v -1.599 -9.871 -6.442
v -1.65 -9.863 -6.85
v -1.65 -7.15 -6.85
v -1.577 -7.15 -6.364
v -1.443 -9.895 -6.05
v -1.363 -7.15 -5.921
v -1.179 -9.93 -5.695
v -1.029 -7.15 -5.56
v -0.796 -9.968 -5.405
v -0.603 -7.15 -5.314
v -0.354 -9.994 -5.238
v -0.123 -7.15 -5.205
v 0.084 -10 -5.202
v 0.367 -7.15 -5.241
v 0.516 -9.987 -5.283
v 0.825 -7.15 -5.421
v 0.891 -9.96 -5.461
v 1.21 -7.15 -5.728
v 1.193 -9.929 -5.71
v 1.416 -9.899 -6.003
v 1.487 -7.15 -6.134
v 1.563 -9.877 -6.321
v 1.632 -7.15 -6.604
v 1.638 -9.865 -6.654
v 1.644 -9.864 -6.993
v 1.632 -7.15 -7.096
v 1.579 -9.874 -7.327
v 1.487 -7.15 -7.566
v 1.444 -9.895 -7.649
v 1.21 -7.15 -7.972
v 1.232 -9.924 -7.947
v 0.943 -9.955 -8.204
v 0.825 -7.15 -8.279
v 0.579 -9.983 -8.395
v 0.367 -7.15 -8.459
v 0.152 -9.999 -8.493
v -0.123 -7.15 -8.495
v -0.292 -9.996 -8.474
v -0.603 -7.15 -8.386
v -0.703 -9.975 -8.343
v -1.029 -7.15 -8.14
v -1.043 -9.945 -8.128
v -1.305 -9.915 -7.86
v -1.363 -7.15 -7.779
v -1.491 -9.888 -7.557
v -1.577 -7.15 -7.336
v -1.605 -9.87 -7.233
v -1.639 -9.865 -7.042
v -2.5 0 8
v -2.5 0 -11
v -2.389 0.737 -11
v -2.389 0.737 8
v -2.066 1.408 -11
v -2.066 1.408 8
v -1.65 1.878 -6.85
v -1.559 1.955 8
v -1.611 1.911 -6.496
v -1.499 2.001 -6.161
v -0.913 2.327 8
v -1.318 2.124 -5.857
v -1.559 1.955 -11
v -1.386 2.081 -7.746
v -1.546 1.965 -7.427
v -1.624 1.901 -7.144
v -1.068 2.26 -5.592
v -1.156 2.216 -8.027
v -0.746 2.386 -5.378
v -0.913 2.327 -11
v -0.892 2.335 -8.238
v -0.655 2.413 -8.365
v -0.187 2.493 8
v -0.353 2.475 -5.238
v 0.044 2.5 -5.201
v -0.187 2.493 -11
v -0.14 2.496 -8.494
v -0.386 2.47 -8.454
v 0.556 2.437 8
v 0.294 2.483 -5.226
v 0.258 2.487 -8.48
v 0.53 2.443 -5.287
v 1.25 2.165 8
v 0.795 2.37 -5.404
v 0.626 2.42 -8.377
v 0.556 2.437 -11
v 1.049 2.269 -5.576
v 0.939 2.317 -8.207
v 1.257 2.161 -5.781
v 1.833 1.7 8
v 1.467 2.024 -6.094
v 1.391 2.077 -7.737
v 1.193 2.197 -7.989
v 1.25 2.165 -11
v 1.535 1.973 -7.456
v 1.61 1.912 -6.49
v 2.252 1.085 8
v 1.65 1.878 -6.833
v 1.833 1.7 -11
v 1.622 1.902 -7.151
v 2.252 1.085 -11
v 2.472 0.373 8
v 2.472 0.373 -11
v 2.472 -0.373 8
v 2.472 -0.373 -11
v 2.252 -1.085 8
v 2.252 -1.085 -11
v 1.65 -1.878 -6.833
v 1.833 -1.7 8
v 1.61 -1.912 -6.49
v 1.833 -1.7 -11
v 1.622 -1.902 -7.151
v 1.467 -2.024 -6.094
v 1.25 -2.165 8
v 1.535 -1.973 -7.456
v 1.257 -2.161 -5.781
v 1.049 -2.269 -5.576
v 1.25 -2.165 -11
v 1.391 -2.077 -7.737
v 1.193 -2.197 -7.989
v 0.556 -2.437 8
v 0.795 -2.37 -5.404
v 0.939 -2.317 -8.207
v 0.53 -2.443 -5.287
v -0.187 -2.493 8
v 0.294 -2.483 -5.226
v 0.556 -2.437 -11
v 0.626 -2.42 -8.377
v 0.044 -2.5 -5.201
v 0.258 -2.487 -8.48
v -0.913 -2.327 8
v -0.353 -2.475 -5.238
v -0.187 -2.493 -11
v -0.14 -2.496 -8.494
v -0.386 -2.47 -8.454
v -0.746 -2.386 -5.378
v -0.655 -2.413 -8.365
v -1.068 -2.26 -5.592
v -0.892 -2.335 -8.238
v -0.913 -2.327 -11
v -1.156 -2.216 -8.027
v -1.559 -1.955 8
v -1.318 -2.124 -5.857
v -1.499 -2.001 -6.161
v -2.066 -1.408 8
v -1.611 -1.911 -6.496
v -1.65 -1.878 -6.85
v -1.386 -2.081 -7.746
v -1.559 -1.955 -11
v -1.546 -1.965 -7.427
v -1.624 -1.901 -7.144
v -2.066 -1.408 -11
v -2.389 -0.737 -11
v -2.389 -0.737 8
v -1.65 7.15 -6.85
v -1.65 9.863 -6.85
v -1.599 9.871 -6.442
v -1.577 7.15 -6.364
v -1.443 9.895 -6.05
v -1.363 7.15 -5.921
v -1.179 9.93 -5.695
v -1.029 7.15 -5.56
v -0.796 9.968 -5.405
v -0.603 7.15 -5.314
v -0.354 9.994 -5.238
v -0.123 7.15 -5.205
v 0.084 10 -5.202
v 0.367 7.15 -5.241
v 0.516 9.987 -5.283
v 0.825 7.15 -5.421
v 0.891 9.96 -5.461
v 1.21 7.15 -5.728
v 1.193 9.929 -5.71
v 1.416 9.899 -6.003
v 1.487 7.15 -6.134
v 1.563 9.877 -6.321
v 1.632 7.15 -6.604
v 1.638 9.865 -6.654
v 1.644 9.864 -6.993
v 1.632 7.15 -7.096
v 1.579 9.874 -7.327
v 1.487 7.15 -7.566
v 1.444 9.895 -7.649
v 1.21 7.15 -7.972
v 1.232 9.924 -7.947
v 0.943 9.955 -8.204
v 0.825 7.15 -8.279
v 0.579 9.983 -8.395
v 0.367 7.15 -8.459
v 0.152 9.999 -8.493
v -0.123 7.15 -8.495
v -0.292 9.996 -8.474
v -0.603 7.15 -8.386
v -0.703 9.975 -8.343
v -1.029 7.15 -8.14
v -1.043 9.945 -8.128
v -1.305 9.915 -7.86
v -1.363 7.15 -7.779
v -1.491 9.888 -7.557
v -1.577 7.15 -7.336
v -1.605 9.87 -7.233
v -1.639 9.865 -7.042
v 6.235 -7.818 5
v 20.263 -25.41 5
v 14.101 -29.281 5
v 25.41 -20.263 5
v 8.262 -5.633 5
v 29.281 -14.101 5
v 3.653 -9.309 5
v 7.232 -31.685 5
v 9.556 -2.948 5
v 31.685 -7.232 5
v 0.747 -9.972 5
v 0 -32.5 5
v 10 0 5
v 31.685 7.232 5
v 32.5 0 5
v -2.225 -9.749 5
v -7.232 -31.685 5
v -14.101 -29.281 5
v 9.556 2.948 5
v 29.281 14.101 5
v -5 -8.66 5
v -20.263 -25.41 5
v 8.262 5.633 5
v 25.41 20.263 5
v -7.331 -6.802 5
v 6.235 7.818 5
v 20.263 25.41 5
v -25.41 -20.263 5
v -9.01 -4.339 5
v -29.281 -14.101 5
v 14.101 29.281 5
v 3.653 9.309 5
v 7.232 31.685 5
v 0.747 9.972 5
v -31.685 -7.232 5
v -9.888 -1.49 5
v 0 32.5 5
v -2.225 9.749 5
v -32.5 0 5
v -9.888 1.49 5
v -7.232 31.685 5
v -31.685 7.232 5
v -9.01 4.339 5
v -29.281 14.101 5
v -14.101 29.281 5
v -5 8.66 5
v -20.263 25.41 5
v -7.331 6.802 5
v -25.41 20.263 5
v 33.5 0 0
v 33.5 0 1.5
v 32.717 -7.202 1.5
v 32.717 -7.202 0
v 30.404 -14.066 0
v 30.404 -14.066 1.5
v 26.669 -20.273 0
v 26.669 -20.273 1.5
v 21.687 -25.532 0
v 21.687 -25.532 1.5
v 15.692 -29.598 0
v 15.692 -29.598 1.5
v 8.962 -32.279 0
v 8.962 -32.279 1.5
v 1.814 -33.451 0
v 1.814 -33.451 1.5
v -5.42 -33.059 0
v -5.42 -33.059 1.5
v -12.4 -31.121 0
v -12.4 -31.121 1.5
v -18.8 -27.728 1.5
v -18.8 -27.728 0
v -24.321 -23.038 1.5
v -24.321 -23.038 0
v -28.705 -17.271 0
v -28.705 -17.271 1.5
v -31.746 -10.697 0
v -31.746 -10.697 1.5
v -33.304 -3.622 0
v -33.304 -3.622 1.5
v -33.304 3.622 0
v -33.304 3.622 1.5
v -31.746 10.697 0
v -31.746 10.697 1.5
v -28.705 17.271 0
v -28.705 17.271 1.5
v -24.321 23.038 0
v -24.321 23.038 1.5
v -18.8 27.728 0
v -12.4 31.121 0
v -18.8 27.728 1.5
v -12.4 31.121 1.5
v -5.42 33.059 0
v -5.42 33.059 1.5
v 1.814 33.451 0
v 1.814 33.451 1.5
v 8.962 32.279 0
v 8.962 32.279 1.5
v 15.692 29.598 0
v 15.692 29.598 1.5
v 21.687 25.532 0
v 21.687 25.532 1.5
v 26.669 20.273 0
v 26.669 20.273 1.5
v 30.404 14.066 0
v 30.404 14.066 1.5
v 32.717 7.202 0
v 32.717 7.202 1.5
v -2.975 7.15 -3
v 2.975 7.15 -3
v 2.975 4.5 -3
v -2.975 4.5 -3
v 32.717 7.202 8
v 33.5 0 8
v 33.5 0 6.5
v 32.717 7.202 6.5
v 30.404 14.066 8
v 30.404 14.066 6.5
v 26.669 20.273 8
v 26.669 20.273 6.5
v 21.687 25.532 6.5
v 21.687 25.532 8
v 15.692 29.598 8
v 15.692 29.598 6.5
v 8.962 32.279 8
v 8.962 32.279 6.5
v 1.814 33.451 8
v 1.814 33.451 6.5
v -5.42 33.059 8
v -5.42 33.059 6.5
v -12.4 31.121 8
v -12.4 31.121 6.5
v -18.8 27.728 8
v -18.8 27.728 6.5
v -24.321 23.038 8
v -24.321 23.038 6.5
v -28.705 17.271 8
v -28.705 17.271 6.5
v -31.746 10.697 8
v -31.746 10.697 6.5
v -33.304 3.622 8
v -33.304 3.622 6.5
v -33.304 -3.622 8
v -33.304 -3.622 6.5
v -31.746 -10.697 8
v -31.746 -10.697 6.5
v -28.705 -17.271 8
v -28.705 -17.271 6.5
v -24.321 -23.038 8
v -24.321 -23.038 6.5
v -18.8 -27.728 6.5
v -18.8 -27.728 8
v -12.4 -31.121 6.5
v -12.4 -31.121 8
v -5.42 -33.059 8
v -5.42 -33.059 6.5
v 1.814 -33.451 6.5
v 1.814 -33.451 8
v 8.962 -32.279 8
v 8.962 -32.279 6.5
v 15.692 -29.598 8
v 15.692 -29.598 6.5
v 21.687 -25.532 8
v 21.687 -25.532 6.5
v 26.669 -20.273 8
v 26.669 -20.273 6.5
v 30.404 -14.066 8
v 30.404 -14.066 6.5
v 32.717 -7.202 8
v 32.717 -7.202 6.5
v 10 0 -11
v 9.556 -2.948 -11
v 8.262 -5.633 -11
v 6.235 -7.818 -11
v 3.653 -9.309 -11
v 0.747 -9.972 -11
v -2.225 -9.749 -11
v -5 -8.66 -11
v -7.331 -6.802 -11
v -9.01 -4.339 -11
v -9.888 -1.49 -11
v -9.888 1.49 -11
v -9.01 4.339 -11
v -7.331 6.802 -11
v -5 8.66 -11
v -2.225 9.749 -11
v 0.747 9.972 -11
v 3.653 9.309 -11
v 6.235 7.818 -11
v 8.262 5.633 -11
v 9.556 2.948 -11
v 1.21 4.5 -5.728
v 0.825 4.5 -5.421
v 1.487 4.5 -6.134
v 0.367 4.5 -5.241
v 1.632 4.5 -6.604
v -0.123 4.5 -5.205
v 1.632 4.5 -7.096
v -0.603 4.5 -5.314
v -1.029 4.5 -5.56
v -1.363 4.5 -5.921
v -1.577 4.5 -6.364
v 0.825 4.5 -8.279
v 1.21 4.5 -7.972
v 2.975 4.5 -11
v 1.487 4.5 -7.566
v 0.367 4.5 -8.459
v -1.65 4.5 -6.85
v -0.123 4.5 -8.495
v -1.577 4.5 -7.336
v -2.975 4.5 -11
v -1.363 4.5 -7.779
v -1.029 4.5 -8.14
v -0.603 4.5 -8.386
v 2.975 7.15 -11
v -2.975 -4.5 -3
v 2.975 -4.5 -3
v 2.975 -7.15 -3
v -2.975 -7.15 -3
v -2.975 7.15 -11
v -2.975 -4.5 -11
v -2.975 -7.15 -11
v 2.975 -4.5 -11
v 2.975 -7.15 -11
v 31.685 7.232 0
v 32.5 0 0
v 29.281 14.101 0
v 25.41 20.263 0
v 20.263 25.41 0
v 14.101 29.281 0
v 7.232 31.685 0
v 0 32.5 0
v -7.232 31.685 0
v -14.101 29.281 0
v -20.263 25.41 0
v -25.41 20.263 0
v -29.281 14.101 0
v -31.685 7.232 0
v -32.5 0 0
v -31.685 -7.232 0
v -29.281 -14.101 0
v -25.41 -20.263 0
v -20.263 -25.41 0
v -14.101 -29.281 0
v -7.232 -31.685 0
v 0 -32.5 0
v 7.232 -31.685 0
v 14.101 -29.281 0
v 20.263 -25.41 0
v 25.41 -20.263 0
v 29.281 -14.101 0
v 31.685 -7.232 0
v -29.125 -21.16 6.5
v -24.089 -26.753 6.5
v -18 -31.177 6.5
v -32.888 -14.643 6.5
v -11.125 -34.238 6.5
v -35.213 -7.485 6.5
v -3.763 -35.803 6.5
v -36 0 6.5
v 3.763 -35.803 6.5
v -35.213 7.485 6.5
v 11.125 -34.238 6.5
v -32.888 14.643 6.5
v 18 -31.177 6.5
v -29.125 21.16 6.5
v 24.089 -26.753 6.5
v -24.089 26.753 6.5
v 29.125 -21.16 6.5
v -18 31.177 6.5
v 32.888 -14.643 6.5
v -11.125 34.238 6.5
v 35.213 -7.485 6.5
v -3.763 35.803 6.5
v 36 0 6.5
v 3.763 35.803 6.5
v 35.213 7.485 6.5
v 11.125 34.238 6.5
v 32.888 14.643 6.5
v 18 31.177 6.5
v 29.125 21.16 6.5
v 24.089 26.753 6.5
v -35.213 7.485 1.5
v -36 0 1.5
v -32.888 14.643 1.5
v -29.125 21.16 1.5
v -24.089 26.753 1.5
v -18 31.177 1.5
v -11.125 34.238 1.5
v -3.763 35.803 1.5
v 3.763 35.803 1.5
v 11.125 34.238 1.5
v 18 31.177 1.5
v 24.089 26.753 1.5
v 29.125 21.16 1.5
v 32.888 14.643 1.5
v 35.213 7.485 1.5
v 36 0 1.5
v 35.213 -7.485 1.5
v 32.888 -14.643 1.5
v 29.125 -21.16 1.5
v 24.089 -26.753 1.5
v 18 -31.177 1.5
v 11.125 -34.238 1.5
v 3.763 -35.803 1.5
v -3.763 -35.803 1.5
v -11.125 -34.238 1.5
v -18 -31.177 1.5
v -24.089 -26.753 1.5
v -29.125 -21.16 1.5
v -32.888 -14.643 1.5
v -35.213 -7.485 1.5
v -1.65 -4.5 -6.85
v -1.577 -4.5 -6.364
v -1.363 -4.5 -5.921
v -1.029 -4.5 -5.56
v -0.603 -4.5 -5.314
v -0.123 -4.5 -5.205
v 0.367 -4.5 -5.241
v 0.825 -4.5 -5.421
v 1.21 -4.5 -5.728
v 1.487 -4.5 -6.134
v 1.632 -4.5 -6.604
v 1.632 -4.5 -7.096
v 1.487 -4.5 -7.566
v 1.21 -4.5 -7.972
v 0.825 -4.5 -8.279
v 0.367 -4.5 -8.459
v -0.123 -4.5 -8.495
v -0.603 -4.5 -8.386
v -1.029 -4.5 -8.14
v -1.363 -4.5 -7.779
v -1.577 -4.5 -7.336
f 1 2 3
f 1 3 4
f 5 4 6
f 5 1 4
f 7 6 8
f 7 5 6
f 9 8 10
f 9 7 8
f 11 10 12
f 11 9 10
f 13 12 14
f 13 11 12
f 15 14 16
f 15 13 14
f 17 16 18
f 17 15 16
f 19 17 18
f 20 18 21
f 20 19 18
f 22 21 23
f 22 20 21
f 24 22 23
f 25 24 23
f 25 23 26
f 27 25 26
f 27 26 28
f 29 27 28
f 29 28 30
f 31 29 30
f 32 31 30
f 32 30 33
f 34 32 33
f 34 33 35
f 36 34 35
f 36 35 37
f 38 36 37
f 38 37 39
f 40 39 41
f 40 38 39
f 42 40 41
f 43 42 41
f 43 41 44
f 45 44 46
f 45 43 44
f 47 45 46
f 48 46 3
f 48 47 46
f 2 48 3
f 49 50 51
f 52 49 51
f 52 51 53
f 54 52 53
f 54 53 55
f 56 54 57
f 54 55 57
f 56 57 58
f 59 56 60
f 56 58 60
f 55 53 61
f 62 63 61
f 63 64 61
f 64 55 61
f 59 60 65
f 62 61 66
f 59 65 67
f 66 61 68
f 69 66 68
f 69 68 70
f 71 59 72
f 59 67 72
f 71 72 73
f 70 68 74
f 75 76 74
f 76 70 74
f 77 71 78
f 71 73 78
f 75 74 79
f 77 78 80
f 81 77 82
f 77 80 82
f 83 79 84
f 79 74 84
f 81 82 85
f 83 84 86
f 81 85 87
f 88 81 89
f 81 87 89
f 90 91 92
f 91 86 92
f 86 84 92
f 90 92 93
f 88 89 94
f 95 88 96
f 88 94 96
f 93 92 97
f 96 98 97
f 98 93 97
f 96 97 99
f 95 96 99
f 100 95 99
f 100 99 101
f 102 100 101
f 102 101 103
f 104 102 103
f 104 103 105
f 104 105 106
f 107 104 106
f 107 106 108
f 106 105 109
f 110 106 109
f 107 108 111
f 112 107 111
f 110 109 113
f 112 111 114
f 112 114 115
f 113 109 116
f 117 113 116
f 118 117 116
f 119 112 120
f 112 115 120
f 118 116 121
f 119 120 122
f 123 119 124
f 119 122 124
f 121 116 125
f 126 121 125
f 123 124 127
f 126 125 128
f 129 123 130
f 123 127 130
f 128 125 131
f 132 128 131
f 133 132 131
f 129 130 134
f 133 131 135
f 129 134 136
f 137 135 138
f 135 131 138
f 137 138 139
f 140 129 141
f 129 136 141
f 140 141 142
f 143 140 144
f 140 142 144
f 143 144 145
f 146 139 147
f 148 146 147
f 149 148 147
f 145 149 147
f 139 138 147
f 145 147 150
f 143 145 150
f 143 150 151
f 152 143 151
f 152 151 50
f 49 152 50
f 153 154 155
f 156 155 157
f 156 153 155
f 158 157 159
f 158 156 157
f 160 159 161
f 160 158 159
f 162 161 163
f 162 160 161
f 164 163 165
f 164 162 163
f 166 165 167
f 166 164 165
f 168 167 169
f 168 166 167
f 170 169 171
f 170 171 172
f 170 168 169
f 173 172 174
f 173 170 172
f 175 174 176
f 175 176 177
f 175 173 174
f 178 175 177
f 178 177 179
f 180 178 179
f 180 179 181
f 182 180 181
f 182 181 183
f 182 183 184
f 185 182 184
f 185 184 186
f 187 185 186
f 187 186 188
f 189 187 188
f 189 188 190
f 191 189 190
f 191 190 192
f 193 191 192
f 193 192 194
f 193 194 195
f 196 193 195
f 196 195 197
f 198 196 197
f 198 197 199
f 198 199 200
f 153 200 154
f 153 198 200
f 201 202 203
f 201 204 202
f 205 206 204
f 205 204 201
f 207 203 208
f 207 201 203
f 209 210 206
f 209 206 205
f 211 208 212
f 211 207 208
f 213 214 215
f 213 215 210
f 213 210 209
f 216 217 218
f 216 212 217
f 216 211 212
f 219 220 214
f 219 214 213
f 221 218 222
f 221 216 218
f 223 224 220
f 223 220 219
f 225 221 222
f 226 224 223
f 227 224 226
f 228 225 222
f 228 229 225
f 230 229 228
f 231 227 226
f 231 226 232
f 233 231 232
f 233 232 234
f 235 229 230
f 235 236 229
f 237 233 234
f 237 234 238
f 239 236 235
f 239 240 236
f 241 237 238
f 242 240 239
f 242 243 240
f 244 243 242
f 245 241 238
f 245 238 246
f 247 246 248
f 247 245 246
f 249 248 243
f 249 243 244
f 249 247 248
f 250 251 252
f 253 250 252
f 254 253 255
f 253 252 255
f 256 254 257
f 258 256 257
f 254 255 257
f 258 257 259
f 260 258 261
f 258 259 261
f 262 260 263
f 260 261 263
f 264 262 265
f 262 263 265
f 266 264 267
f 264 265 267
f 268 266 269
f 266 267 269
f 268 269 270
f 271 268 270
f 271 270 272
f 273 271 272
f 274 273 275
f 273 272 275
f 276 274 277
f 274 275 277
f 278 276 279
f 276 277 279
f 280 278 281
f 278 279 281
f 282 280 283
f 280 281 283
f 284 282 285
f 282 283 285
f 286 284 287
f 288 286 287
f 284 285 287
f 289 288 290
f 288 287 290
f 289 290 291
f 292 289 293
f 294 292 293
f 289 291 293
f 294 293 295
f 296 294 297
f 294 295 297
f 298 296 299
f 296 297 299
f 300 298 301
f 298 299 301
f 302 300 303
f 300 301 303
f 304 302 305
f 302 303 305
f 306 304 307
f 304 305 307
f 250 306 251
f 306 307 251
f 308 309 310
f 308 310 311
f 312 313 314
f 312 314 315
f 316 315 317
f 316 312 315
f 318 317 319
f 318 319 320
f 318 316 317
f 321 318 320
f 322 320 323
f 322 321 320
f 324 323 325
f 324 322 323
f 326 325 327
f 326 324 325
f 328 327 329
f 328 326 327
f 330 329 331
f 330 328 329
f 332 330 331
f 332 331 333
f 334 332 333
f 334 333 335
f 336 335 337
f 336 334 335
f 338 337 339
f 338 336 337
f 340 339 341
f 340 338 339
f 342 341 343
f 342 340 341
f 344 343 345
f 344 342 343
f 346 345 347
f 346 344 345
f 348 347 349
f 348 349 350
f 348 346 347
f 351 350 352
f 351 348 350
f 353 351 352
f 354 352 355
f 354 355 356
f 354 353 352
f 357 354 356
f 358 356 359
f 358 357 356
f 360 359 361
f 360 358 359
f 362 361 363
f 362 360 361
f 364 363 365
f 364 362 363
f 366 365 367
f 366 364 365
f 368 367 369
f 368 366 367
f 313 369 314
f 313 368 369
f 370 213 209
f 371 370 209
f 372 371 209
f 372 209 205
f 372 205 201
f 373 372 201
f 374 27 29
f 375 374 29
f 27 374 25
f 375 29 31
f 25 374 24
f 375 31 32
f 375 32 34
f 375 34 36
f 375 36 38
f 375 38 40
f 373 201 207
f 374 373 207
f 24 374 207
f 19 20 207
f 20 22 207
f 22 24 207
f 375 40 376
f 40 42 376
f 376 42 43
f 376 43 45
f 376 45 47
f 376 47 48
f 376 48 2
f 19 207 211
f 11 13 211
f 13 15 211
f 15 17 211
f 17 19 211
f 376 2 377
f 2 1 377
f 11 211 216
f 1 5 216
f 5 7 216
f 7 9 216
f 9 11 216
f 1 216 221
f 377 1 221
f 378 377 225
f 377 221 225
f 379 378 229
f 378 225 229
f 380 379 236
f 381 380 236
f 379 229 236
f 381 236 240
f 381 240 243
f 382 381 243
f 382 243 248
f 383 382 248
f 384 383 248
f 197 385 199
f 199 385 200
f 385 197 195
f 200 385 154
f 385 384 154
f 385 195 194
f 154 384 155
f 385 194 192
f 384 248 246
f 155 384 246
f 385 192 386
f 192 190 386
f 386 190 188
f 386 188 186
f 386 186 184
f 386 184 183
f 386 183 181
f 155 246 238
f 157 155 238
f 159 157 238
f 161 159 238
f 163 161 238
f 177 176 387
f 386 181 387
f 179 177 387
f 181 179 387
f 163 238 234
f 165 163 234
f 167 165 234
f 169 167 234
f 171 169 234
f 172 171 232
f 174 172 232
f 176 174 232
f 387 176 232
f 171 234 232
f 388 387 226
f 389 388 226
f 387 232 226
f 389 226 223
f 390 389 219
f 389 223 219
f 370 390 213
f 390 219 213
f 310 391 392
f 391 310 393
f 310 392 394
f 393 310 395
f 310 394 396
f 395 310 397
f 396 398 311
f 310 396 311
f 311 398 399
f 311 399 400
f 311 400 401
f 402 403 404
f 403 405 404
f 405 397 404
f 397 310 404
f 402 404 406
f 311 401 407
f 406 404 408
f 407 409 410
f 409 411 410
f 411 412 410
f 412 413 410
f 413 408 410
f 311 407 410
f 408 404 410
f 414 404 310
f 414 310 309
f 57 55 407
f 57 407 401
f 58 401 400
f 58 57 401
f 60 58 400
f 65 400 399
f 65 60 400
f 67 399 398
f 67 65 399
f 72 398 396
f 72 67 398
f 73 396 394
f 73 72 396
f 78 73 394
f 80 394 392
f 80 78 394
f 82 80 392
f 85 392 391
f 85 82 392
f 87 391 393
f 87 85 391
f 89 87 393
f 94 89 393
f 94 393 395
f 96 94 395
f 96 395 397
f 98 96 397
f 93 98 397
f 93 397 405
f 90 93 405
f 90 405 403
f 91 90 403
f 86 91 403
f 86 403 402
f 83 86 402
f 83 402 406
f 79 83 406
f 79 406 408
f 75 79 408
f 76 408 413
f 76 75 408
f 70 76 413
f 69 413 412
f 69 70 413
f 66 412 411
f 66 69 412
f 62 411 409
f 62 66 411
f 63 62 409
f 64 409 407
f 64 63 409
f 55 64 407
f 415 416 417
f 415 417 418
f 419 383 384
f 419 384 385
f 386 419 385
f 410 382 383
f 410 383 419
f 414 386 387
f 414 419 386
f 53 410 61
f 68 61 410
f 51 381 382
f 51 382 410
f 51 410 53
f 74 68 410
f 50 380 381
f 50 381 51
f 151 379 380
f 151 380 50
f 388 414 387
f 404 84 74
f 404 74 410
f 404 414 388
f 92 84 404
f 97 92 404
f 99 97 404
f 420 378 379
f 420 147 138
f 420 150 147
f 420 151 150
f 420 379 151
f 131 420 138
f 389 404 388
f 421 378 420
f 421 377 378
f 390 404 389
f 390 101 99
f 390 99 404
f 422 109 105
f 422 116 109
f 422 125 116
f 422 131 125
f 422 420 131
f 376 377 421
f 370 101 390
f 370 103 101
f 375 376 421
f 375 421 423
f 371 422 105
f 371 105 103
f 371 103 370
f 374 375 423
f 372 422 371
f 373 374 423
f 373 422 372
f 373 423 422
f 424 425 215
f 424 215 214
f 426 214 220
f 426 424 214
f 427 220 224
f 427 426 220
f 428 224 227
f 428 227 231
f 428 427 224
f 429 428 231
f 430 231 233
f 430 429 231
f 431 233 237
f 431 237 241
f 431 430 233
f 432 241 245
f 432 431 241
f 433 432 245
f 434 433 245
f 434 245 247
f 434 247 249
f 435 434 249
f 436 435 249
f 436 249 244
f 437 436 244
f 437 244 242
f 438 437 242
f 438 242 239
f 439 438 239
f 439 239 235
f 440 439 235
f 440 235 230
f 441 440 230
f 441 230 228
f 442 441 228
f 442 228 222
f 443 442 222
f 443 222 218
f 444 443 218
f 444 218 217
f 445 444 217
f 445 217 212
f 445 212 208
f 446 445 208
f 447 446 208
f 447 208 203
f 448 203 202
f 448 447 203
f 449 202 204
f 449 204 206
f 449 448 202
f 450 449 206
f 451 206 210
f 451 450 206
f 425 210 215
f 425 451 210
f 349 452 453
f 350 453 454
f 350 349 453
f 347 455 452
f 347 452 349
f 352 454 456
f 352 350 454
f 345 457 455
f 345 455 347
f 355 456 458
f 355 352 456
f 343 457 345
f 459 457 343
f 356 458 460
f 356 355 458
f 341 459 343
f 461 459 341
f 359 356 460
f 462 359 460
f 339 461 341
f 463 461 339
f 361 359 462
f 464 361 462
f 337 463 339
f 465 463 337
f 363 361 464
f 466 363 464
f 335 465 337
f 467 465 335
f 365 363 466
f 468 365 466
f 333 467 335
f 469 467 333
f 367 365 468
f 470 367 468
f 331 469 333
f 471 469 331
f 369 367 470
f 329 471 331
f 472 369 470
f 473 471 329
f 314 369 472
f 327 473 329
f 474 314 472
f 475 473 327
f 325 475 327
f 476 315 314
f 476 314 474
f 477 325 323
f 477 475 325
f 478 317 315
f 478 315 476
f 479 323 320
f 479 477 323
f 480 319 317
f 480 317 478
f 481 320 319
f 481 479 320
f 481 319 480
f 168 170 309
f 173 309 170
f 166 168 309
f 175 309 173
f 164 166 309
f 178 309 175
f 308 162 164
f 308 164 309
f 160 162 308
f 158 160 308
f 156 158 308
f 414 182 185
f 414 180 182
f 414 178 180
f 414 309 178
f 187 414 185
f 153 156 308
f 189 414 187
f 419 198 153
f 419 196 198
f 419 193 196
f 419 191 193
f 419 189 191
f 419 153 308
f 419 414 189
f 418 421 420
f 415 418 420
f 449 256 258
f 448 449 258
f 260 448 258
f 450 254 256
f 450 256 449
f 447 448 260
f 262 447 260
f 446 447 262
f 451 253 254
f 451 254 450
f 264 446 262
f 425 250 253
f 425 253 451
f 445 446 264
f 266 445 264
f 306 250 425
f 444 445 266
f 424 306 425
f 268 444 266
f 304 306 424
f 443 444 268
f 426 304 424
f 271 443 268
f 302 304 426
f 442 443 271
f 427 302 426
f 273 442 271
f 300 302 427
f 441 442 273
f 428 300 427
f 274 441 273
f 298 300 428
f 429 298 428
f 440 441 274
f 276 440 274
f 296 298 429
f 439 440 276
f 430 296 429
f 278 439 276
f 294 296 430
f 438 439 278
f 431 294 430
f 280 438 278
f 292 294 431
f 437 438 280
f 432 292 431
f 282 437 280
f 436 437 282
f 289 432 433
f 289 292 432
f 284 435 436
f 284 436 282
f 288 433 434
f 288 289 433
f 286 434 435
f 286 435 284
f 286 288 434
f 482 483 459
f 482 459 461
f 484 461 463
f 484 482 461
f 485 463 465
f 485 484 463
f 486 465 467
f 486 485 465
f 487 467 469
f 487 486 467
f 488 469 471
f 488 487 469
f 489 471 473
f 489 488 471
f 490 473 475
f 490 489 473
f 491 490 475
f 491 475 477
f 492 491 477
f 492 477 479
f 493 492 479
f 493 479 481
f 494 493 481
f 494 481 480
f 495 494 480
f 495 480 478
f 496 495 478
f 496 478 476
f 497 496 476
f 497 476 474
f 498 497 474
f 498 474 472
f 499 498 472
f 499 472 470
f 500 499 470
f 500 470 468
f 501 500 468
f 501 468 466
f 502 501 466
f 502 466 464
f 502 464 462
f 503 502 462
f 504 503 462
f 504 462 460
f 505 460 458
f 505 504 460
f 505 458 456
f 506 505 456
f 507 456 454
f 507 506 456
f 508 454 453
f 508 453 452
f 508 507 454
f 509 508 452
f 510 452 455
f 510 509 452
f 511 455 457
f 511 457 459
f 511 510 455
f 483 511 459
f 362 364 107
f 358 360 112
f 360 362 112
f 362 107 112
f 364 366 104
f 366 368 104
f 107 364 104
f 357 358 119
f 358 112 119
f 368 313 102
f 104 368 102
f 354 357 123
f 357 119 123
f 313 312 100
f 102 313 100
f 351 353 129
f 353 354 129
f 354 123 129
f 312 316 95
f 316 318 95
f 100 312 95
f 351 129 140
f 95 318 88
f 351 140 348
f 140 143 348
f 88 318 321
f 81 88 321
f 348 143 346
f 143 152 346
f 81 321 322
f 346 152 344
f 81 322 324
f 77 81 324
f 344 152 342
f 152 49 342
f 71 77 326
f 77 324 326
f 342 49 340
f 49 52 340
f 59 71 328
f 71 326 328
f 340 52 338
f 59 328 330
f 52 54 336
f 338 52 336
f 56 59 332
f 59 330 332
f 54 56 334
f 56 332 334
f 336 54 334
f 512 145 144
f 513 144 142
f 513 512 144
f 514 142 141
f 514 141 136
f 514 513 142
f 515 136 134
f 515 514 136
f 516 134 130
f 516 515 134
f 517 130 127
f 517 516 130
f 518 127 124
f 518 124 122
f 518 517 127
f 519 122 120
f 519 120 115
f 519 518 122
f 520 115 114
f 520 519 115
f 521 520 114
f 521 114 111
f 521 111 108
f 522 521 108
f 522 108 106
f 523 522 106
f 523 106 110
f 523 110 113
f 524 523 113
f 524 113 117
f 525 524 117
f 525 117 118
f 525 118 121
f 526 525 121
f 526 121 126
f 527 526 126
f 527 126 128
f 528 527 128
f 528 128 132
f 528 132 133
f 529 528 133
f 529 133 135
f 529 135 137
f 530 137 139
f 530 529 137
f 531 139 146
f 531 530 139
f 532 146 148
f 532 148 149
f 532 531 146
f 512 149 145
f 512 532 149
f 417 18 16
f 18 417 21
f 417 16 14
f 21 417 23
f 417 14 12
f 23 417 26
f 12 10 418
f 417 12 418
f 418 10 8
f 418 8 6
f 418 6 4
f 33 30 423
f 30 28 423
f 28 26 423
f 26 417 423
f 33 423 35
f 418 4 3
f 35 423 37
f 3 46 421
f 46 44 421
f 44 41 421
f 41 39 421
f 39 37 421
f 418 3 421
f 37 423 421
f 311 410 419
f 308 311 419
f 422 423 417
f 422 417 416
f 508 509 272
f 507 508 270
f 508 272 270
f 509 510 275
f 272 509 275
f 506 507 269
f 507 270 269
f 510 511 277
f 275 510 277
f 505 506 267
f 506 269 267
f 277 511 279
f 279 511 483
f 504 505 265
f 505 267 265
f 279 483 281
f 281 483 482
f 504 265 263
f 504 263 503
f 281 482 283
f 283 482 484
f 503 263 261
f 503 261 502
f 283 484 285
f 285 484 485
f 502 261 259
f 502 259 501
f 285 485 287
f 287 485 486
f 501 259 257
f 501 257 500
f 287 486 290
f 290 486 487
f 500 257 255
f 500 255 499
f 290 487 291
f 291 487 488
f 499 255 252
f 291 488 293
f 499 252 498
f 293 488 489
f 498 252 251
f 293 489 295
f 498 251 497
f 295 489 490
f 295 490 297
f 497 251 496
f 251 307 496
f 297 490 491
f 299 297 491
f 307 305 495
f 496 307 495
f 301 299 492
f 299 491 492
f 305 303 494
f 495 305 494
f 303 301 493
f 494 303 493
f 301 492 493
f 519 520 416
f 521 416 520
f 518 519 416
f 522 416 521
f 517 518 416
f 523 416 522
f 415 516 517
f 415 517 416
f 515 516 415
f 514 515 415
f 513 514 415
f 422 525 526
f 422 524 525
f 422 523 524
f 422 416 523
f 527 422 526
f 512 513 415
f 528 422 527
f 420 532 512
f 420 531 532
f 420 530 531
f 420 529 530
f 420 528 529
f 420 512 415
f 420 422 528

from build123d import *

# Parameters (mm, degrees)
ESBO_O1_R                     = 35
ESBO_O1_R_2                   = 32.5
RESSALTO_EXTRUS_O1_DEPTH      = 8
RESSALTO_EXTRUS_O2_START      = -3
ESBO_O2_R                     = 32.5
RESSALTO_EXTRUS_O2_DEPTH      = 3
ESBO_O3_R                     = 2.5
CORTE_EXTRUS_O1_DEPTH         = 3
RESSALTO_EXTRUS_O3_DEPTH      = 5
RESSALTO_EXTRUS_O3_DEPTH_BACK = 3
ESBO_O4_R                     = 37
ESBO_O4_R_2                   = 35
ESBO_O5_W                     = 1.8
ESBO_O5_H                     = 3
ESBO_O6_R                     = 12.55
RESSALTO_EXTRUS_O4_DEPTH      = 5
CORTE_EXTRUS_O2_DEPTH         = 53.933921071
CORTE_EXTRUS_O2_DEPTH_BACK    = 53.933921071
ESBO_O7_R                     = 7.55
RESSALTO_EXTRUS_O5_START      = -8
ESBO_O8_R                     = 37
ESBO_O8_R_2                   = 32.5
RESSALTO_EXTRUS_O5_DEPTH      = 8
ESBO_O9_R                     = 37
ESBO_O9_R_2                   = 33.5
CORTE_EXTRUS_O8_DEPTH         = 1.5
CORTE_EXTRUS_O9_START         = -1.5
ESBO_O12_R                    = 37
ESBO_O12_R_2                  = 33.5
CORTE_EXTRUS_O9_DEPTH         = 1.5
CORTE_EXTRUS_O10_START        = -10
ESBO_O13_R                    = 37
ESBO_O13_R_2                  = 36
CORTE_EXTRUS_O10_DEPTH        = 10
ESBO_O14_R                    = 37
ESBO_O14_R_2                  = 36
RESSALTO_EXTRUS_O6_DEPTH      = 5
ESBO_O15_R                    = 12.55
CORTE_EXTRUS_O11_DEPTH        = 53.933921071
ESBO_O16_R                    = 12.55
RESSALTO_EXTRUS_O7_DEPTH      = 3
ESBO_O17_R                    = 10
RESSALTO_EXTRUS_O8_DEPTH      = 16
ESBO_O18_R                    = 2.5
CORTE_EXTRUS_O12_DEPTH        = 56.668662639
ESBO_O19_W                    = 5.95
ESBO_O19_H                    = 2.65
CORTE_EXTRUS_O13_DEPTH        = 8
CORTE_EXTRUS_O14_DEPTH        = 57.676714795
CORTE_EXTRUS_O14_DEPTH_BACK   = 57.676714795
ESBO_O21_R                    = 1.65
ESBO_O23_R                    = 37
ESBO_O23_R_2                  = 36
CORTE_EXTRUS_O15_DEPTH        = 54.798234195


with BuildPart() as part:
    # Esboço1 → Ressalto-extrusão1 (new body)
    with BuildSketch(Plane.XY):
        Circle(ESBO_O1_R)
        Circle(ESBO_O1_R_2, mode=Mode.SUBTRACT)
    extrude(amount=RESSALTO_EXTRUS_O1_DEPTH)

    # Esboço2 → Ressalto-extrusão2 (add)
    with BuildSketch(Plane.XY.offset(8).offset(RESSALTO_EXTRUS_O2_START)):
        Circle(ESBO_O2_R)
    extrude(amount=RESSALTO_EXTRUS_O2_DEPTH)

    # Esboço3 → Corte-extrusão1 (cut)
    with BuildSketch(Plane.XY.offset(8)):
        Circle(ESBO_O3_R)
    extrude(amount=-CORTE_EXTRUS_O1_DEPTH, mode=Mode.SUBTRACT)

    # Esboço4 → Ressalto-extrusão3 (add, two sides: drawn at the far end of the back side and taken through both)
    with BuildSketch(Plane(origin=(0, 0, 5), x_dir=(-1, 0, 0), z_dir=(0, 0, -1)).offset(-RESSALTO_EXTRUS_O3_DEPTH_BACK)):
        Circle(ESBO_O4_R)
        Circle(ESBO_O4_R_2, mode=Mode.SUBTRACT)
    extrude(amount=RESSALTO_EXTRUS_O3_DEPTH + RESSALTO_EXTRUS_O3_DEPTH_BACK)

    # Esboço5 → Corte-Revolução1 (revolve, cut)
    with BuildSketch(Plane(origin=(0, 0, 0), x_dir=(1, 0, 0), z_dir=(0, 1, 0))):
        with Locations((-36.1, -2.5)):
            Rectangle(ESBO_O5_W, ESBO_O5_H)
        with Locations((-36.1, -5.5)):
            Rectangle(ESBO_O5_W, ESBO_O5_H)
    revolve(axis=Axis((0, 0, 8), (0, 0, -1)), mode=Mode.SUBTRACT)

    # Esboço6 → Ressalto-extrusão4 (add)
    with BuildSketch(Plane(origin=(0, 0, 5), x_dir=(-1, 0, 0), z_dir=(0, 0, -1))):
        with Locations(Location((0, 0, 0), (0, 0, 180))):
            Circle(ESBO_O6_R)
    extrude(amount=RESSALTO_EXTRUS_O4_DEPTH)

    # Esboço7 → Corte-extrusão2 (cut, two sides: drawn at the far end of the back side and taken through both)
    with BuildSketch(Plane(origin=(0, 0, 0), x_dir=(-1, 0, 0), z_dir=(0, 0, -1)).offset(-CORTE_EXTRUS_O2_DEPTH_BACK)):
        Circle(ESBO_O7_R)
    extrude(amount=CORTE_EXTRUS_O2_DEPTH + CORTE_EXTRUS_O2_DEPTH_BACK, mode=Mode.SUBTRACT)

    # Esboço8 → Ressalto-extrusão5 (add)
    with BuildSketch(Plane.XY.offset(8).offset(RESSALTO_EXTRUS_O5_START)):
        with Locations(Location((0, 0, 0), (0, 0, 180))):
            Circle(ESBO_O8_R)
        Circle(ESBO_O8_R_2, mode=Mode.SUBTRACT)
    extrude(amount=RESSALTO_EXTRUS_O5_DEPTH)

    # Esboço9 → Corte-extrusão8 (cut)
    with BuildSketch(Plane.XY.offset(8)):
        with Locations(Location((0, 0, 0), (0, 0, 180))):
            Circle(ESBO_O9_R)
        Circle(ESBO_O9_R_2, mode=Mode.SUBTRACT)
    extrude(amount=-CORTE_EXTRUS_O8_DEPTH, mode=Mode.SUBTRACT)

    # Esboço12 → Corte-extrusão9 (cut)
    with BuildSketch(Plane(origin=(0, 0, 0), x_dir=(-1, 0, 0), z_dir=(0, 0, -1)).offset(CORTE_EXTRUS_O9_START)):
        Circle(ESBO_O12_R)
        with Locations(Location((0, 0, 0), (0, 0, 180))):
            Circle(ESBO_O12_R_2, mode=Mode.SUBTRACT)
    extrude(amount=CORTE_EXTRUS_O9_DEPTH, mode=Mode.SUBTRACT)

    # Esboço13 → Corte-extrusão10 (cut)
    with BuildSketch(Plane(origin=(0, 0, 1.5), x_dir=(-1, 0, 0), z_dir=(0, 0, -1)).offset(CORTE_EXTRUS_O10_START)):
        Circle(ESBO_O13_R)
        Circle(ESBO_O13_R_2, mode=Mode.SUBTRACT)
    extrude(amount=CORTE_EXTRUS_O10_DEPTH, mode=Mode.SUBTRACT)

    # Esboço14 → Ressalto-extrusão6 (add)
    with BuildSketch(Plane.XY.offset(6.5)):
        Circle(ESBO_O14_R)
        Circle(ESBO_O14_R_2, mode=Mode.SUBTRACT)
    extrude(amount=-RESSALTO_EXTRUS_O6_DEPTH)

    # Esboço15 → Corte-extrusão11 (cut, through all)
    with BuildSketch(Plane(origin=(0, 0, 0), x_dir=(-1, 0, 0), z_dir=(0, 0, -1))):
        Circle(ESBO_O15_R)
    extrude(amount=-CORTE_EXTRUS_O11_DEPTH, mode=Mode.SUBTRACT)

    # Esboço16 → Ressalto-extrusão7 (add, through all)
    with BuildSketch(Plane(origin=(0, 0, 5), x_dir=(-1, 0, 0), z_dir=(0, 0, -1))):
        Circle(ESBO_O16_R)
    extrude(amount=-RESSALTO_EXTRUS_O7_DEPTH)

    # Esboço17 → Ressalto-extrusão8 (add)
    with BuildSketch(Plane(origin=(0, 0, 5), x_dir=(-1, 0, 0), z_dir=(0, 0, -1))):
        with Locations(Location((0, 0, 0), (0, 0, 180))):
            Circle(ESBO_O17_R)
    extrude(amount=RESSALTO_EXTRUS_O8_DEPTH)

    # Esboço18 → Corte-extrusão12 (cut, through all)
    with BuildSketch(Plane(origin=(0, 0, -11), x_dir=(-1, 0, 0), z_dir=(0, 0, -1))):
        Circle(ESBO_O18_R)
    extrude(amount=-CORTE_EXTRUS_O12_DEPTH, mode=Mode.SUBTRACT)

    # Esboço19 → Corte-extrusão13 (cut)
    with BuildSketch(Plane(origin=(0, 0, -11), x_dir=(-1, 0, 0), z_dir=(0, 0, -1))):
        with Locations((0, -5.825)):
            Rectangle(ESBO_O19_W, ESBO_O19_H)
        with Locations((0, 5.825)):
            Rectangle(ESBO_O19_W, ESBO_O19_H)
    extrude(amount=-CORTE_EXTRUS_O13_DEPTH, mode=Mode.SUBTRACT)

    # Esboço21 → Corte-extrusão14 (cut, two sides: drawn at the far end of the back side and taken through both)
    with BuildSketch(Plane(origin=(0, 4.5, 0), x_dir=(1, 0, 0), z_dir=(0, 1, 0)).offset(-CORTE_EXTRUS_O14_DEPTH_BACK)):
        with Locations(Location((0, 6.85, 0), (0, 0, 180))):
            Circle(ESBO_O21_R)
    extrude(amount=CORTE_EXTRUS_O14_DEPTH + CORTE_EXTRUS_O14_DEPTH_BACK, mode=Mode.SUBTRACT)

    # Esboço23 → Corte-extrusão15 (cut, through all)
    with BuildSketch(Plane(origin=(0, 0, 1.5), x_dir=(-1, 0, 0), z_dir=(0, 0, -1))):
        Circle(ESBO_O23_R)
        Circle(ESBO_O23_R_2, mode=Mode.SUBTRACT)
    extrude(amount=-CORTE_EXTRUS_O15_DEPTH, mode=Mode.SUBTRACT)


solid = part.part
